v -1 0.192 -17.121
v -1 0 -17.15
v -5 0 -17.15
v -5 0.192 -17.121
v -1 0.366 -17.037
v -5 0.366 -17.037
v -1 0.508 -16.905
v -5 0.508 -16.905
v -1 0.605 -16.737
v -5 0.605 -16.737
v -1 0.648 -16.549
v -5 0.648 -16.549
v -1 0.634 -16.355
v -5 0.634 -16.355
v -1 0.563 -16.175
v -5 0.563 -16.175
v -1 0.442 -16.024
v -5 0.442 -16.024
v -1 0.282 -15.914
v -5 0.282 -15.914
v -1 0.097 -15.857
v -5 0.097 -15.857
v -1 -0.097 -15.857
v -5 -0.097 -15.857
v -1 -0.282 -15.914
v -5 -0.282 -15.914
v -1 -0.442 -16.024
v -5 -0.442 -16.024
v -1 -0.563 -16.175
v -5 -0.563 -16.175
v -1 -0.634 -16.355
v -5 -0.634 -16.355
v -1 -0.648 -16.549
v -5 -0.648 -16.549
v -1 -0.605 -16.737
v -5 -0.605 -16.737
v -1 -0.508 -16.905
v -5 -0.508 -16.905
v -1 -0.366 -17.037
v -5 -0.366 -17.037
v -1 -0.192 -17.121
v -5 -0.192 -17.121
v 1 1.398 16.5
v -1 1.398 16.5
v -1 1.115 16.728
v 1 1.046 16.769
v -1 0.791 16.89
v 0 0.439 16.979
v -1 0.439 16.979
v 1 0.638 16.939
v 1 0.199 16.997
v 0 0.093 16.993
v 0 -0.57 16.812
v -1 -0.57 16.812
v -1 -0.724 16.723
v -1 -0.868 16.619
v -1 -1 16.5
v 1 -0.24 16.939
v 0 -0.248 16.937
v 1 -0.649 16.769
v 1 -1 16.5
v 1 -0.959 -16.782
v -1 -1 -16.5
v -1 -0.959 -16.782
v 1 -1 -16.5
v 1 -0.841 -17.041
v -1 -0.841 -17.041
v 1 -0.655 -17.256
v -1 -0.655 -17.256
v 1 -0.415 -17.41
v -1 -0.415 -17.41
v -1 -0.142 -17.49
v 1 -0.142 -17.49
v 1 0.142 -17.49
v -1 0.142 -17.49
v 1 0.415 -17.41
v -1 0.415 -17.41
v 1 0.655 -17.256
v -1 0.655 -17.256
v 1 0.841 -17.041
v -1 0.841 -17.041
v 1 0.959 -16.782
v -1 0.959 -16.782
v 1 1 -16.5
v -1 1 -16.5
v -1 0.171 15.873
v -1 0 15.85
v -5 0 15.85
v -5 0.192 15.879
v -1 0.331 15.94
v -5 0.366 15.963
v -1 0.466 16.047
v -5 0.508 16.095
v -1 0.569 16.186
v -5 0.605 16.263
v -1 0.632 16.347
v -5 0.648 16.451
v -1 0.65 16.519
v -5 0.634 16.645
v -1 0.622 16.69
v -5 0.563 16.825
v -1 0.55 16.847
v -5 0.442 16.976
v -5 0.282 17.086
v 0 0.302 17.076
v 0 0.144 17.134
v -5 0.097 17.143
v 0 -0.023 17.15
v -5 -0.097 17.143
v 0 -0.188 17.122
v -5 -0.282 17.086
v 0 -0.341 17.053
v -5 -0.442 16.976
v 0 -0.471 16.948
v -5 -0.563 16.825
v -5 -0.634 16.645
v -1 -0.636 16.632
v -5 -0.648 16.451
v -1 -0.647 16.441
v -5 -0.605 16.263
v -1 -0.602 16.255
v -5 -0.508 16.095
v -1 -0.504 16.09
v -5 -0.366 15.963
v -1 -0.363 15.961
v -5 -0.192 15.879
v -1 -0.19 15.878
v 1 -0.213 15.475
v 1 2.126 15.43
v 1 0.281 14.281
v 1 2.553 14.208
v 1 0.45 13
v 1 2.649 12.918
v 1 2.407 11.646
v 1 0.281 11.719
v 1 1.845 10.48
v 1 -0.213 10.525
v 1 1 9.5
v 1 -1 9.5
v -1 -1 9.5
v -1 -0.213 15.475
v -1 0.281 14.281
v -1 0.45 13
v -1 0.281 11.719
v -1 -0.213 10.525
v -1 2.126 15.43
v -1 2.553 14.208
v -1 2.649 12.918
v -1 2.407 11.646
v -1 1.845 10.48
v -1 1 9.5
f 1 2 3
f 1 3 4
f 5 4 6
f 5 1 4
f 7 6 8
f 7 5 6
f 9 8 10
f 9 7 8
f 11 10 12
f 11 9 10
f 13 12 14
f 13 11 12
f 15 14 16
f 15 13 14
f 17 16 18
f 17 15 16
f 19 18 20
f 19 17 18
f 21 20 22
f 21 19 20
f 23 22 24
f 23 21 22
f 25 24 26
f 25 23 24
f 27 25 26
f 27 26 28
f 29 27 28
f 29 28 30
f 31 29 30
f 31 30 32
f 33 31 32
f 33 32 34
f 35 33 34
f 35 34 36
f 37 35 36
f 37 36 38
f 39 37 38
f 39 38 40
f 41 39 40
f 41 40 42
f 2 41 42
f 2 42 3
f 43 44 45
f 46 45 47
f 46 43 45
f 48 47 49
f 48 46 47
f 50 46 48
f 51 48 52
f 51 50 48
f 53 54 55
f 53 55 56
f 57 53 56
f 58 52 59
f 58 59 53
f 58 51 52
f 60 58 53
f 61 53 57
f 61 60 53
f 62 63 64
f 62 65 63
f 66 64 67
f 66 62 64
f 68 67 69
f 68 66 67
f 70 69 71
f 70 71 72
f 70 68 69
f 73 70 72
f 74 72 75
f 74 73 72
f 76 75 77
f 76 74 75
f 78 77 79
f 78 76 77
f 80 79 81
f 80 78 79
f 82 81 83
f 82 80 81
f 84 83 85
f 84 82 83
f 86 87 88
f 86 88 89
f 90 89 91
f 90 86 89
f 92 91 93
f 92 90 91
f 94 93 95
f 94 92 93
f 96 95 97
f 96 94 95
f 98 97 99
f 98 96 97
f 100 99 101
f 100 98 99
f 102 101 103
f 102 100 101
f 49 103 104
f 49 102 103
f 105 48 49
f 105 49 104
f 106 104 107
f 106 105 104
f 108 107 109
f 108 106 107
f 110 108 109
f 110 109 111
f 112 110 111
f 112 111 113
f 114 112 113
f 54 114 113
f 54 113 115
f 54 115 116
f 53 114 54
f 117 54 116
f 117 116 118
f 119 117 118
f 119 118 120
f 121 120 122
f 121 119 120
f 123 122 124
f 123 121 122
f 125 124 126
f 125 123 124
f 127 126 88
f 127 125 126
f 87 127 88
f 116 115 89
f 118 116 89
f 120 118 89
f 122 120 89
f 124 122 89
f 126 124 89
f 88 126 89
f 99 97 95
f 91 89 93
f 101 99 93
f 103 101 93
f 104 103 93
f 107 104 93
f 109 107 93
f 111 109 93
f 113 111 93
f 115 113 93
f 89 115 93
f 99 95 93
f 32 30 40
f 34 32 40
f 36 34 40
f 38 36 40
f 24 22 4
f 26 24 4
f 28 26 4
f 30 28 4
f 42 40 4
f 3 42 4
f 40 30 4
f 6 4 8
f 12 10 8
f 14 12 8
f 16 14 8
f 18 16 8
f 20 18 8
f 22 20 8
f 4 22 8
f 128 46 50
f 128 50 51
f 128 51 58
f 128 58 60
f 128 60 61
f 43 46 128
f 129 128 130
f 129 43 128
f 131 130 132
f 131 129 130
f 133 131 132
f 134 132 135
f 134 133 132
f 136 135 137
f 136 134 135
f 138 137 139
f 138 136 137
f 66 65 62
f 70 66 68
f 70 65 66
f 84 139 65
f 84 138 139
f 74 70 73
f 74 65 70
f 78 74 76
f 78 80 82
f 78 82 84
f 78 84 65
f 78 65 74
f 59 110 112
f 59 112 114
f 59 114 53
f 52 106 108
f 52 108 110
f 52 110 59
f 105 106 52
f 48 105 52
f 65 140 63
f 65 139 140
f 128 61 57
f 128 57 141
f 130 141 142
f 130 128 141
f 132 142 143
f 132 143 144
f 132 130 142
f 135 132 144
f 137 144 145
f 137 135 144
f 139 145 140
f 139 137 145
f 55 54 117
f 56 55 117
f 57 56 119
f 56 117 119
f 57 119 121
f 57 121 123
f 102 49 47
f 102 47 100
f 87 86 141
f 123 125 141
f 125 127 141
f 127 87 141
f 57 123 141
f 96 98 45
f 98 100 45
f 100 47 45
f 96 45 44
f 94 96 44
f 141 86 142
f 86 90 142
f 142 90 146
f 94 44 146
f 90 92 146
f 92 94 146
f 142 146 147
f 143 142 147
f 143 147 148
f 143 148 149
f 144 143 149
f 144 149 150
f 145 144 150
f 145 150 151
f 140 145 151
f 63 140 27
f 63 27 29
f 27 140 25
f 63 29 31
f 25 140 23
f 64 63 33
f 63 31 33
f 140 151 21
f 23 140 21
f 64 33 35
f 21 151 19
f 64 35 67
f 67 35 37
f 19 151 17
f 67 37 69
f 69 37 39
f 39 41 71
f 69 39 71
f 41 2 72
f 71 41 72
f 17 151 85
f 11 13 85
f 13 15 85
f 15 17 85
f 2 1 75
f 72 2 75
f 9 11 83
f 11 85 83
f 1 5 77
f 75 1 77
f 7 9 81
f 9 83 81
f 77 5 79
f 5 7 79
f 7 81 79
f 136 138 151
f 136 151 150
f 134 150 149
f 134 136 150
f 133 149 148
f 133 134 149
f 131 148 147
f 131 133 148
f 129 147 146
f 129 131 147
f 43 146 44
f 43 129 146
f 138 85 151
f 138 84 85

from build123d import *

# Parameters (mm, degrees)
BOSS_EXTRUDE1_DEPTH = 1
SKETCH2_R           = 0.65
BOSS_EXTRUDE2_DEPTH = 5
SKETCH3_R           = 0.65
BOSS_EXTRUDE3_DEPTH = 5


with BuildPart() as part:
    # Sketch1 → Boss-Extrude1 (new, symmetric)
    with BuildSketch(Plane(origin=(0, 0, 0), x_dir=(0, 0, -1), z_dir=(1, 0, 0))):
        with BuildLine():
            Line((16.5, 1), (-9.5, 1))
            ThreePointArc((-9.5, 1), (-12.917652634, 2.648551595), (-16.5, 1.397608254))
            ThreePointArc((-16.5, 1.397608254), (-16.996560928, 0.198804127), (-16.5, -1))
            ThreePointArc((-16.5, -1), (-13, 0.449747468), (-9.5, -1))
            Line((-9.5, -1), (16.5, -1))
            ThreePointArc((16.5, -1), (17.5, 0), (16.5, 1))
        make_face()
    extrude(amount=BOSS_EXTRUDE1_DEPTH, both=True)

    # Sketch2 → Boss-Extrude2 (add)
    with BuildSketch(Plane(origin=(0, 0, 0), x_dir=(0, 0, -1), z_dir=(1, 0, 0))):
        with Locations((-16.5, 0)):
            Circle(SKETCH2_R)
    extrude(amount=-BOSS_EXTRUDE2_DEPTH)

    # Sketch3 → Boss-Extrude3 (add)
    with BuildSketch(Plane(origin=(0, 0, 0), x_dir=(0, 0, -1), z_dir=(1, 0, 0))):
        with Locations((16.5, 0)):
            Circle(SKETCH3_R)
    extrude(amount=-BOSS_EXTRUDE3_DEPTH)


solid = part.part
